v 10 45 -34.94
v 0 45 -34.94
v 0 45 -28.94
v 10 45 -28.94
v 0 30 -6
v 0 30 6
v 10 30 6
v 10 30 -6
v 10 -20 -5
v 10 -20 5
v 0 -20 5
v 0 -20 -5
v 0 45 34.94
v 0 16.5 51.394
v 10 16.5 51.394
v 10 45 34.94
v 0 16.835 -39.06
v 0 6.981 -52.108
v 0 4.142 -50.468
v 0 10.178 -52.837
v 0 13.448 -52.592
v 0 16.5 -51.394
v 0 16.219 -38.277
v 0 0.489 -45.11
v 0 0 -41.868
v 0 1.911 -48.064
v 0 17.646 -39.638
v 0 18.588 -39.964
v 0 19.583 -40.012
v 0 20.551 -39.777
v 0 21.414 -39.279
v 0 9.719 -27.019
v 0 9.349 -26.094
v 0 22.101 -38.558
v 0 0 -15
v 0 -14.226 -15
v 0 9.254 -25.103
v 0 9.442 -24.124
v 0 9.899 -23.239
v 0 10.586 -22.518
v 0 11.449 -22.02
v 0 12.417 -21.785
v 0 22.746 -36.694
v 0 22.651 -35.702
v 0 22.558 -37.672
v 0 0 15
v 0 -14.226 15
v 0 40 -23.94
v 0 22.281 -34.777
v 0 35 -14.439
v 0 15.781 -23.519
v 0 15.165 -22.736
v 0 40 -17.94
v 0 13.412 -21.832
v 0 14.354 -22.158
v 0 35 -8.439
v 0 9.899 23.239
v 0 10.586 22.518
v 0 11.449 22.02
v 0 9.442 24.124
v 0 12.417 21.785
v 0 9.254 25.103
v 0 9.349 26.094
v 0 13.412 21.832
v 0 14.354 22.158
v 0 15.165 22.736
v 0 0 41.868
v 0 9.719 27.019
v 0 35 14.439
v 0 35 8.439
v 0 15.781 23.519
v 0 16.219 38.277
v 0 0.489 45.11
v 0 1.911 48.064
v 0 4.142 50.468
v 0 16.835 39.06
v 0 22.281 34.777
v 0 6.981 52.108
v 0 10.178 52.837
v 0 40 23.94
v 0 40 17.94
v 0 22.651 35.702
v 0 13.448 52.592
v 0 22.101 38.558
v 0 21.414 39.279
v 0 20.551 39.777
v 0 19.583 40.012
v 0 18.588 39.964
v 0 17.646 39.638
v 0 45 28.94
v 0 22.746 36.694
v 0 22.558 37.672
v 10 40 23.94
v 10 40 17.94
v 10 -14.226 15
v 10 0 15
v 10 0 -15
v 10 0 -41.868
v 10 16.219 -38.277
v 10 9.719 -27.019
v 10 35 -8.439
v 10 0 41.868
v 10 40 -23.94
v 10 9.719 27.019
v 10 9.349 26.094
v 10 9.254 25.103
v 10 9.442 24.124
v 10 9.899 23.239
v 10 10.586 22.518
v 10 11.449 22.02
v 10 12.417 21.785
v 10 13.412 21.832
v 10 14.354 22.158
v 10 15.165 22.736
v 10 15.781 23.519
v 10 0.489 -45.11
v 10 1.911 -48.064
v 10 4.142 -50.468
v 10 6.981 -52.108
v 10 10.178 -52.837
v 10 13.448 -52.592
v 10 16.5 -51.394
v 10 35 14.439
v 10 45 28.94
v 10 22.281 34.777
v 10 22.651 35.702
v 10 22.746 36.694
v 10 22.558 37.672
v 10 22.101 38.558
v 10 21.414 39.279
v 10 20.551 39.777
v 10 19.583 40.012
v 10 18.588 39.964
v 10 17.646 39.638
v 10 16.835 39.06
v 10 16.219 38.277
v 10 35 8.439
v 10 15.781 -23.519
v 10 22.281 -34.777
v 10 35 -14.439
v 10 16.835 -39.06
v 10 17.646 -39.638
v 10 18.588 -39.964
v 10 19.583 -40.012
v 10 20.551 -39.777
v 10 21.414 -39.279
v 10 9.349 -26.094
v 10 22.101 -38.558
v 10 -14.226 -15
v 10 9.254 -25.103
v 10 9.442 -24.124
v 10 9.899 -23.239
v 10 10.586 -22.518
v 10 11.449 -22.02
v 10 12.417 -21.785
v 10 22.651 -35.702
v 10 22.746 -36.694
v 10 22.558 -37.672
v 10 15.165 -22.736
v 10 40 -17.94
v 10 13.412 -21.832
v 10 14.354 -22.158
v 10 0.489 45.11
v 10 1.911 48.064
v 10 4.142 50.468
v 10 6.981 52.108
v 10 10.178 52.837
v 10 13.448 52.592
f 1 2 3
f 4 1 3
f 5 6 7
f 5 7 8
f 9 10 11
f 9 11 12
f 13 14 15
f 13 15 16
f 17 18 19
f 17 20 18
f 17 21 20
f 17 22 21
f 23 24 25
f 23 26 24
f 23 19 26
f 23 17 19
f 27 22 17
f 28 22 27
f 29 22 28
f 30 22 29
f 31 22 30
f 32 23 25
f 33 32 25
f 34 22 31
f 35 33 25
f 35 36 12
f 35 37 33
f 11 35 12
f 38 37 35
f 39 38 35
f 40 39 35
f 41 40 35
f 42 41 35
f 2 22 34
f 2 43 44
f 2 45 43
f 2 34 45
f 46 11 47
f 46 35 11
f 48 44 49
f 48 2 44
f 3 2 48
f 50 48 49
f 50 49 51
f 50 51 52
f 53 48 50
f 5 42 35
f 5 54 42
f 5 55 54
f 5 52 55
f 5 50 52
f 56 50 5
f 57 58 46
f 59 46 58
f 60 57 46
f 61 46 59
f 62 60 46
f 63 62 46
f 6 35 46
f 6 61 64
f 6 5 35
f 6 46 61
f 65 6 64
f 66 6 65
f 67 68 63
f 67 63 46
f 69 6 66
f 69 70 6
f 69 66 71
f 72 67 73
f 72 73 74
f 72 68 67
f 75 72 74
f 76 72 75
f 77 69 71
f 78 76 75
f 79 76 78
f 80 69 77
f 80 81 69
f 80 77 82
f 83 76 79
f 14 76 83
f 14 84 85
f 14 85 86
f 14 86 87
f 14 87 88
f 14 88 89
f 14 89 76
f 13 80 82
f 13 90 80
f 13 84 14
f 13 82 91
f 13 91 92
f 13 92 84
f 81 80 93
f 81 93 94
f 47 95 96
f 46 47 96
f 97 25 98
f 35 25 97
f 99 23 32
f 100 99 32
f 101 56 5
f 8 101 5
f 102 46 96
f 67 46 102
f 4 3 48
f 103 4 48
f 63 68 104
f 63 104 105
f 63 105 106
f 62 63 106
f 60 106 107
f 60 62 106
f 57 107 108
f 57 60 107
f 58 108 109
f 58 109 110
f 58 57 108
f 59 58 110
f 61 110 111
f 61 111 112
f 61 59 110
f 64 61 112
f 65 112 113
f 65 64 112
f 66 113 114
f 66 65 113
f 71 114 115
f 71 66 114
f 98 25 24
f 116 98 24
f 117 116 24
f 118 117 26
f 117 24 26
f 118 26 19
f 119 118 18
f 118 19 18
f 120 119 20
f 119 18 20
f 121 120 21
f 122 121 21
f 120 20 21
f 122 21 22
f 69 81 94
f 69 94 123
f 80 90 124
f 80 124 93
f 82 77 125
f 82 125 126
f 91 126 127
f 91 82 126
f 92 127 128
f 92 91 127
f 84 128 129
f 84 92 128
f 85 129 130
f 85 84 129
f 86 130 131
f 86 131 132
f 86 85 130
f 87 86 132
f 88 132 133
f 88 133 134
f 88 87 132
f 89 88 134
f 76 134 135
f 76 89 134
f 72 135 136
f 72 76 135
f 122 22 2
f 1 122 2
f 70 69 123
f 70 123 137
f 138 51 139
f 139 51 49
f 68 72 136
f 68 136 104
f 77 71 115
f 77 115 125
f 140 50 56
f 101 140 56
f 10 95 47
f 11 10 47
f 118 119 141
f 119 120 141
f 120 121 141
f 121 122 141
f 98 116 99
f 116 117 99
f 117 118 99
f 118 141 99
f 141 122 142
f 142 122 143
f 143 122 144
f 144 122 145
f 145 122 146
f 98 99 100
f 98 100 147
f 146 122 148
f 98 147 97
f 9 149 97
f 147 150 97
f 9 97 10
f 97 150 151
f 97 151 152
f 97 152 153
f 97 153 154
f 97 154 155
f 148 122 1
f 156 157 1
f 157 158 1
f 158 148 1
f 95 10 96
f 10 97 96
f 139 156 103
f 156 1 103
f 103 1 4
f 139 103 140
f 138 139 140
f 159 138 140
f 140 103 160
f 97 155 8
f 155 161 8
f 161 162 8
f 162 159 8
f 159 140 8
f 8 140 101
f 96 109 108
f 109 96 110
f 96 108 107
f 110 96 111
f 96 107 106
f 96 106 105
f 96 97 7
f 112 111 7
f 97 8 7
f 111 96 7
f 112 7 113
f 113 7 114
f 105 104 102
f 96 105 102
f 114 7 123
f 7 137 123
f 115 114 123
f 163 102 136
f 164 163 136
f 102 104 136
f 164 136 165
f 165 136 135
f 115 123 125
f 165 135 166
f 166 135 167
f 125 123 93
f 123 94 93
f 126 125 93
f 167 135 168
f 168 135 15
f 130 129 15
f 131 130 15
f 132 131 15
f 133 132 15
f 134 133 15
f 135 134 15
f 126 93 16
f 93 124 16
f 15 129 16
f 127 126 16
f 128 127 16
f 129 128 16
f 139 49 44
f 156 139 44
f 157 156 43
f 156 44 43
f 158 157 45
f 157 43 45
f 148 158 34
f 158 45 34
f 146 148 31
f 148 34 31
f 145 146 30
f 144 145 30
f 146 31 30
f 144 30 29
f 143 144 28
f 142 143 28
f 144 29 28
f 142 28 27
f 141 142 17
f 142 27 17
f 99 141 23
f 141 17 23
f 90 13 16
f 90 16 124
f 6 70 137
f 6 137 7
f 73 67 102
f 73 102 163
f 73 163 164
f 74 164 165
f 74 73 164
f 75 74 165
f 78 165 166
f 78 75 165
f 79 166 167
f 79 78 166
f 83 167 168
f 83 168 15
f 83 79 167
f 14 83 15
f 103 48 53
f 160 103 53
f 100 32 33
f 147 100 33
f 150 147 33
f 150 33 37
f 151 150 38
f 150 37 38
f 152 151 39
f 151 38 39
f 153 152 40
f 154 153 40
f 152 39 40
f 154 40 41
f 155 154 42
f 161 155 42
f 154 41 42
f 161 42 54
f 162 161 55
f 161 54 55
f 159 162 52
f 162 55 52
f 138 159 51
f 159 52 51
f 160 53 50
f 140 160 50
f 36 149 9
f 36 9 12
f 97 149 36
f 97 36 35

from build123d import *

# Parameters (mm, degrees)
EXTRUDE_1_DEPTH = 10
SKETCH_2_W      = 30
SKETCH_2_H      = 20
EXTRUDE_2_DEPTH = 10
CHAMFER_1_SIZE  = 10
CHAMFER_1_SIZE2 = 5.773502692
CHAMFER_2_SIZE  = 10
CHAMFER_2_SIZE2 = 5.773502692


with BuildPart() as part:
    # Эскиз1 → Бобышка-Вытянуть1 (new body)
    with BuildSketch(Plane(origin=(0, 0, 0), x_dir=(0, 0, -1), z_dir=(1, 0, 0))):
        with BuildLine():
            Line((0, 0), (41.867903864, 0))
            ThreePointArc((41.867903864, 0), (51.394183306, 5.5), (51.394183306, 16.5))
            Line((51.394183306, 16.5), (34.939700634, 45))
            Line((34.939700634, 45), (28.939700634, 45))
            Line((28.939700634, 45), (23.939700634, 40))
            Line((23.939700634, 40), (17.939700634, 40))
            Line((17.939700634, 40), (14.438662943, 35))
            Line((14.438662943, 35), (8.438662943, 35))
            Line((8.438662943, 35), (6, 30))
            Line((6, 30), (0, 30))
            Line((0, 30), (0, 0))
        make_face()
        with BuildLine():
            Line((23.519083625, 15.781088913), (34.777413874, 22.281088913))
            ThreePointArc((34.777413874, 22.281088913), (39.558502787, 21), (38.277413874, 16.218911087))
            Line((38.277413874, 16.218911087), (27.019083625, 9.718911087))
            ThreePointArc((27.019083625, 9.718911087), (22.237994712, 11), (23.519083625, 15.781088913))
        make_face(mode=Mode.SUBTRACT)
    extrude(amount=EXTRUDE_1_DEPTH)

    # Зеркальное отражение1: part across plane


with BuildPart() as part_1:
    add(part.part)
    add(part.part.mirror(Plane(origin=(10, 30, 0), x_dir=(1, 0, 0), z_dir=(0, 0, -1))))

    # Эскиз2 → Бобышка-Вытянуть2 (add)
    with BuildSketch(Plane(origin=(10, 0, 0), x_dir=(0, 0, -1), z_dir=(1, 0, 0))):
        with Locations((0, -10)):
            Rectangle(SKETCH_2_W, SKETCH_2_H)
    extrude(amount=-EXTRUDE_2_DEPTH)

    # Фаска1
    chamfer_1_edges = [part_1.edges().sort_by_distance(p)[0] for p in [
        (5, -20, 15),
    ]]
    chamfer_1_side = [part_1.faces().sort_by_distance(p)[0] for p in [
        (5, -20, 0),
    ]]
    chamfer(chamfer_1_edges, length=CHAMFER_1_SIZE, length2=CHAMFER_1_SIZE2, reference=chamfer_1_side[0])

    # Фаска2
    chamfer_2_edges = [part_1.edges().sort_by_distance(p)[0] for p in [
        (5, -20, -15),
    ]]
    chamfer_2_side = [part_1.faces().sort_by_distance(p)[0] for p in [
        (5, -20, -5),
    ]]
    chamfer(chamfer_2_edges, length=CHAMFER_2_SIZE, length2=CHAMFER_2_SIZE2, reference=chamfer_2_side[0])


solid = part_1.part
